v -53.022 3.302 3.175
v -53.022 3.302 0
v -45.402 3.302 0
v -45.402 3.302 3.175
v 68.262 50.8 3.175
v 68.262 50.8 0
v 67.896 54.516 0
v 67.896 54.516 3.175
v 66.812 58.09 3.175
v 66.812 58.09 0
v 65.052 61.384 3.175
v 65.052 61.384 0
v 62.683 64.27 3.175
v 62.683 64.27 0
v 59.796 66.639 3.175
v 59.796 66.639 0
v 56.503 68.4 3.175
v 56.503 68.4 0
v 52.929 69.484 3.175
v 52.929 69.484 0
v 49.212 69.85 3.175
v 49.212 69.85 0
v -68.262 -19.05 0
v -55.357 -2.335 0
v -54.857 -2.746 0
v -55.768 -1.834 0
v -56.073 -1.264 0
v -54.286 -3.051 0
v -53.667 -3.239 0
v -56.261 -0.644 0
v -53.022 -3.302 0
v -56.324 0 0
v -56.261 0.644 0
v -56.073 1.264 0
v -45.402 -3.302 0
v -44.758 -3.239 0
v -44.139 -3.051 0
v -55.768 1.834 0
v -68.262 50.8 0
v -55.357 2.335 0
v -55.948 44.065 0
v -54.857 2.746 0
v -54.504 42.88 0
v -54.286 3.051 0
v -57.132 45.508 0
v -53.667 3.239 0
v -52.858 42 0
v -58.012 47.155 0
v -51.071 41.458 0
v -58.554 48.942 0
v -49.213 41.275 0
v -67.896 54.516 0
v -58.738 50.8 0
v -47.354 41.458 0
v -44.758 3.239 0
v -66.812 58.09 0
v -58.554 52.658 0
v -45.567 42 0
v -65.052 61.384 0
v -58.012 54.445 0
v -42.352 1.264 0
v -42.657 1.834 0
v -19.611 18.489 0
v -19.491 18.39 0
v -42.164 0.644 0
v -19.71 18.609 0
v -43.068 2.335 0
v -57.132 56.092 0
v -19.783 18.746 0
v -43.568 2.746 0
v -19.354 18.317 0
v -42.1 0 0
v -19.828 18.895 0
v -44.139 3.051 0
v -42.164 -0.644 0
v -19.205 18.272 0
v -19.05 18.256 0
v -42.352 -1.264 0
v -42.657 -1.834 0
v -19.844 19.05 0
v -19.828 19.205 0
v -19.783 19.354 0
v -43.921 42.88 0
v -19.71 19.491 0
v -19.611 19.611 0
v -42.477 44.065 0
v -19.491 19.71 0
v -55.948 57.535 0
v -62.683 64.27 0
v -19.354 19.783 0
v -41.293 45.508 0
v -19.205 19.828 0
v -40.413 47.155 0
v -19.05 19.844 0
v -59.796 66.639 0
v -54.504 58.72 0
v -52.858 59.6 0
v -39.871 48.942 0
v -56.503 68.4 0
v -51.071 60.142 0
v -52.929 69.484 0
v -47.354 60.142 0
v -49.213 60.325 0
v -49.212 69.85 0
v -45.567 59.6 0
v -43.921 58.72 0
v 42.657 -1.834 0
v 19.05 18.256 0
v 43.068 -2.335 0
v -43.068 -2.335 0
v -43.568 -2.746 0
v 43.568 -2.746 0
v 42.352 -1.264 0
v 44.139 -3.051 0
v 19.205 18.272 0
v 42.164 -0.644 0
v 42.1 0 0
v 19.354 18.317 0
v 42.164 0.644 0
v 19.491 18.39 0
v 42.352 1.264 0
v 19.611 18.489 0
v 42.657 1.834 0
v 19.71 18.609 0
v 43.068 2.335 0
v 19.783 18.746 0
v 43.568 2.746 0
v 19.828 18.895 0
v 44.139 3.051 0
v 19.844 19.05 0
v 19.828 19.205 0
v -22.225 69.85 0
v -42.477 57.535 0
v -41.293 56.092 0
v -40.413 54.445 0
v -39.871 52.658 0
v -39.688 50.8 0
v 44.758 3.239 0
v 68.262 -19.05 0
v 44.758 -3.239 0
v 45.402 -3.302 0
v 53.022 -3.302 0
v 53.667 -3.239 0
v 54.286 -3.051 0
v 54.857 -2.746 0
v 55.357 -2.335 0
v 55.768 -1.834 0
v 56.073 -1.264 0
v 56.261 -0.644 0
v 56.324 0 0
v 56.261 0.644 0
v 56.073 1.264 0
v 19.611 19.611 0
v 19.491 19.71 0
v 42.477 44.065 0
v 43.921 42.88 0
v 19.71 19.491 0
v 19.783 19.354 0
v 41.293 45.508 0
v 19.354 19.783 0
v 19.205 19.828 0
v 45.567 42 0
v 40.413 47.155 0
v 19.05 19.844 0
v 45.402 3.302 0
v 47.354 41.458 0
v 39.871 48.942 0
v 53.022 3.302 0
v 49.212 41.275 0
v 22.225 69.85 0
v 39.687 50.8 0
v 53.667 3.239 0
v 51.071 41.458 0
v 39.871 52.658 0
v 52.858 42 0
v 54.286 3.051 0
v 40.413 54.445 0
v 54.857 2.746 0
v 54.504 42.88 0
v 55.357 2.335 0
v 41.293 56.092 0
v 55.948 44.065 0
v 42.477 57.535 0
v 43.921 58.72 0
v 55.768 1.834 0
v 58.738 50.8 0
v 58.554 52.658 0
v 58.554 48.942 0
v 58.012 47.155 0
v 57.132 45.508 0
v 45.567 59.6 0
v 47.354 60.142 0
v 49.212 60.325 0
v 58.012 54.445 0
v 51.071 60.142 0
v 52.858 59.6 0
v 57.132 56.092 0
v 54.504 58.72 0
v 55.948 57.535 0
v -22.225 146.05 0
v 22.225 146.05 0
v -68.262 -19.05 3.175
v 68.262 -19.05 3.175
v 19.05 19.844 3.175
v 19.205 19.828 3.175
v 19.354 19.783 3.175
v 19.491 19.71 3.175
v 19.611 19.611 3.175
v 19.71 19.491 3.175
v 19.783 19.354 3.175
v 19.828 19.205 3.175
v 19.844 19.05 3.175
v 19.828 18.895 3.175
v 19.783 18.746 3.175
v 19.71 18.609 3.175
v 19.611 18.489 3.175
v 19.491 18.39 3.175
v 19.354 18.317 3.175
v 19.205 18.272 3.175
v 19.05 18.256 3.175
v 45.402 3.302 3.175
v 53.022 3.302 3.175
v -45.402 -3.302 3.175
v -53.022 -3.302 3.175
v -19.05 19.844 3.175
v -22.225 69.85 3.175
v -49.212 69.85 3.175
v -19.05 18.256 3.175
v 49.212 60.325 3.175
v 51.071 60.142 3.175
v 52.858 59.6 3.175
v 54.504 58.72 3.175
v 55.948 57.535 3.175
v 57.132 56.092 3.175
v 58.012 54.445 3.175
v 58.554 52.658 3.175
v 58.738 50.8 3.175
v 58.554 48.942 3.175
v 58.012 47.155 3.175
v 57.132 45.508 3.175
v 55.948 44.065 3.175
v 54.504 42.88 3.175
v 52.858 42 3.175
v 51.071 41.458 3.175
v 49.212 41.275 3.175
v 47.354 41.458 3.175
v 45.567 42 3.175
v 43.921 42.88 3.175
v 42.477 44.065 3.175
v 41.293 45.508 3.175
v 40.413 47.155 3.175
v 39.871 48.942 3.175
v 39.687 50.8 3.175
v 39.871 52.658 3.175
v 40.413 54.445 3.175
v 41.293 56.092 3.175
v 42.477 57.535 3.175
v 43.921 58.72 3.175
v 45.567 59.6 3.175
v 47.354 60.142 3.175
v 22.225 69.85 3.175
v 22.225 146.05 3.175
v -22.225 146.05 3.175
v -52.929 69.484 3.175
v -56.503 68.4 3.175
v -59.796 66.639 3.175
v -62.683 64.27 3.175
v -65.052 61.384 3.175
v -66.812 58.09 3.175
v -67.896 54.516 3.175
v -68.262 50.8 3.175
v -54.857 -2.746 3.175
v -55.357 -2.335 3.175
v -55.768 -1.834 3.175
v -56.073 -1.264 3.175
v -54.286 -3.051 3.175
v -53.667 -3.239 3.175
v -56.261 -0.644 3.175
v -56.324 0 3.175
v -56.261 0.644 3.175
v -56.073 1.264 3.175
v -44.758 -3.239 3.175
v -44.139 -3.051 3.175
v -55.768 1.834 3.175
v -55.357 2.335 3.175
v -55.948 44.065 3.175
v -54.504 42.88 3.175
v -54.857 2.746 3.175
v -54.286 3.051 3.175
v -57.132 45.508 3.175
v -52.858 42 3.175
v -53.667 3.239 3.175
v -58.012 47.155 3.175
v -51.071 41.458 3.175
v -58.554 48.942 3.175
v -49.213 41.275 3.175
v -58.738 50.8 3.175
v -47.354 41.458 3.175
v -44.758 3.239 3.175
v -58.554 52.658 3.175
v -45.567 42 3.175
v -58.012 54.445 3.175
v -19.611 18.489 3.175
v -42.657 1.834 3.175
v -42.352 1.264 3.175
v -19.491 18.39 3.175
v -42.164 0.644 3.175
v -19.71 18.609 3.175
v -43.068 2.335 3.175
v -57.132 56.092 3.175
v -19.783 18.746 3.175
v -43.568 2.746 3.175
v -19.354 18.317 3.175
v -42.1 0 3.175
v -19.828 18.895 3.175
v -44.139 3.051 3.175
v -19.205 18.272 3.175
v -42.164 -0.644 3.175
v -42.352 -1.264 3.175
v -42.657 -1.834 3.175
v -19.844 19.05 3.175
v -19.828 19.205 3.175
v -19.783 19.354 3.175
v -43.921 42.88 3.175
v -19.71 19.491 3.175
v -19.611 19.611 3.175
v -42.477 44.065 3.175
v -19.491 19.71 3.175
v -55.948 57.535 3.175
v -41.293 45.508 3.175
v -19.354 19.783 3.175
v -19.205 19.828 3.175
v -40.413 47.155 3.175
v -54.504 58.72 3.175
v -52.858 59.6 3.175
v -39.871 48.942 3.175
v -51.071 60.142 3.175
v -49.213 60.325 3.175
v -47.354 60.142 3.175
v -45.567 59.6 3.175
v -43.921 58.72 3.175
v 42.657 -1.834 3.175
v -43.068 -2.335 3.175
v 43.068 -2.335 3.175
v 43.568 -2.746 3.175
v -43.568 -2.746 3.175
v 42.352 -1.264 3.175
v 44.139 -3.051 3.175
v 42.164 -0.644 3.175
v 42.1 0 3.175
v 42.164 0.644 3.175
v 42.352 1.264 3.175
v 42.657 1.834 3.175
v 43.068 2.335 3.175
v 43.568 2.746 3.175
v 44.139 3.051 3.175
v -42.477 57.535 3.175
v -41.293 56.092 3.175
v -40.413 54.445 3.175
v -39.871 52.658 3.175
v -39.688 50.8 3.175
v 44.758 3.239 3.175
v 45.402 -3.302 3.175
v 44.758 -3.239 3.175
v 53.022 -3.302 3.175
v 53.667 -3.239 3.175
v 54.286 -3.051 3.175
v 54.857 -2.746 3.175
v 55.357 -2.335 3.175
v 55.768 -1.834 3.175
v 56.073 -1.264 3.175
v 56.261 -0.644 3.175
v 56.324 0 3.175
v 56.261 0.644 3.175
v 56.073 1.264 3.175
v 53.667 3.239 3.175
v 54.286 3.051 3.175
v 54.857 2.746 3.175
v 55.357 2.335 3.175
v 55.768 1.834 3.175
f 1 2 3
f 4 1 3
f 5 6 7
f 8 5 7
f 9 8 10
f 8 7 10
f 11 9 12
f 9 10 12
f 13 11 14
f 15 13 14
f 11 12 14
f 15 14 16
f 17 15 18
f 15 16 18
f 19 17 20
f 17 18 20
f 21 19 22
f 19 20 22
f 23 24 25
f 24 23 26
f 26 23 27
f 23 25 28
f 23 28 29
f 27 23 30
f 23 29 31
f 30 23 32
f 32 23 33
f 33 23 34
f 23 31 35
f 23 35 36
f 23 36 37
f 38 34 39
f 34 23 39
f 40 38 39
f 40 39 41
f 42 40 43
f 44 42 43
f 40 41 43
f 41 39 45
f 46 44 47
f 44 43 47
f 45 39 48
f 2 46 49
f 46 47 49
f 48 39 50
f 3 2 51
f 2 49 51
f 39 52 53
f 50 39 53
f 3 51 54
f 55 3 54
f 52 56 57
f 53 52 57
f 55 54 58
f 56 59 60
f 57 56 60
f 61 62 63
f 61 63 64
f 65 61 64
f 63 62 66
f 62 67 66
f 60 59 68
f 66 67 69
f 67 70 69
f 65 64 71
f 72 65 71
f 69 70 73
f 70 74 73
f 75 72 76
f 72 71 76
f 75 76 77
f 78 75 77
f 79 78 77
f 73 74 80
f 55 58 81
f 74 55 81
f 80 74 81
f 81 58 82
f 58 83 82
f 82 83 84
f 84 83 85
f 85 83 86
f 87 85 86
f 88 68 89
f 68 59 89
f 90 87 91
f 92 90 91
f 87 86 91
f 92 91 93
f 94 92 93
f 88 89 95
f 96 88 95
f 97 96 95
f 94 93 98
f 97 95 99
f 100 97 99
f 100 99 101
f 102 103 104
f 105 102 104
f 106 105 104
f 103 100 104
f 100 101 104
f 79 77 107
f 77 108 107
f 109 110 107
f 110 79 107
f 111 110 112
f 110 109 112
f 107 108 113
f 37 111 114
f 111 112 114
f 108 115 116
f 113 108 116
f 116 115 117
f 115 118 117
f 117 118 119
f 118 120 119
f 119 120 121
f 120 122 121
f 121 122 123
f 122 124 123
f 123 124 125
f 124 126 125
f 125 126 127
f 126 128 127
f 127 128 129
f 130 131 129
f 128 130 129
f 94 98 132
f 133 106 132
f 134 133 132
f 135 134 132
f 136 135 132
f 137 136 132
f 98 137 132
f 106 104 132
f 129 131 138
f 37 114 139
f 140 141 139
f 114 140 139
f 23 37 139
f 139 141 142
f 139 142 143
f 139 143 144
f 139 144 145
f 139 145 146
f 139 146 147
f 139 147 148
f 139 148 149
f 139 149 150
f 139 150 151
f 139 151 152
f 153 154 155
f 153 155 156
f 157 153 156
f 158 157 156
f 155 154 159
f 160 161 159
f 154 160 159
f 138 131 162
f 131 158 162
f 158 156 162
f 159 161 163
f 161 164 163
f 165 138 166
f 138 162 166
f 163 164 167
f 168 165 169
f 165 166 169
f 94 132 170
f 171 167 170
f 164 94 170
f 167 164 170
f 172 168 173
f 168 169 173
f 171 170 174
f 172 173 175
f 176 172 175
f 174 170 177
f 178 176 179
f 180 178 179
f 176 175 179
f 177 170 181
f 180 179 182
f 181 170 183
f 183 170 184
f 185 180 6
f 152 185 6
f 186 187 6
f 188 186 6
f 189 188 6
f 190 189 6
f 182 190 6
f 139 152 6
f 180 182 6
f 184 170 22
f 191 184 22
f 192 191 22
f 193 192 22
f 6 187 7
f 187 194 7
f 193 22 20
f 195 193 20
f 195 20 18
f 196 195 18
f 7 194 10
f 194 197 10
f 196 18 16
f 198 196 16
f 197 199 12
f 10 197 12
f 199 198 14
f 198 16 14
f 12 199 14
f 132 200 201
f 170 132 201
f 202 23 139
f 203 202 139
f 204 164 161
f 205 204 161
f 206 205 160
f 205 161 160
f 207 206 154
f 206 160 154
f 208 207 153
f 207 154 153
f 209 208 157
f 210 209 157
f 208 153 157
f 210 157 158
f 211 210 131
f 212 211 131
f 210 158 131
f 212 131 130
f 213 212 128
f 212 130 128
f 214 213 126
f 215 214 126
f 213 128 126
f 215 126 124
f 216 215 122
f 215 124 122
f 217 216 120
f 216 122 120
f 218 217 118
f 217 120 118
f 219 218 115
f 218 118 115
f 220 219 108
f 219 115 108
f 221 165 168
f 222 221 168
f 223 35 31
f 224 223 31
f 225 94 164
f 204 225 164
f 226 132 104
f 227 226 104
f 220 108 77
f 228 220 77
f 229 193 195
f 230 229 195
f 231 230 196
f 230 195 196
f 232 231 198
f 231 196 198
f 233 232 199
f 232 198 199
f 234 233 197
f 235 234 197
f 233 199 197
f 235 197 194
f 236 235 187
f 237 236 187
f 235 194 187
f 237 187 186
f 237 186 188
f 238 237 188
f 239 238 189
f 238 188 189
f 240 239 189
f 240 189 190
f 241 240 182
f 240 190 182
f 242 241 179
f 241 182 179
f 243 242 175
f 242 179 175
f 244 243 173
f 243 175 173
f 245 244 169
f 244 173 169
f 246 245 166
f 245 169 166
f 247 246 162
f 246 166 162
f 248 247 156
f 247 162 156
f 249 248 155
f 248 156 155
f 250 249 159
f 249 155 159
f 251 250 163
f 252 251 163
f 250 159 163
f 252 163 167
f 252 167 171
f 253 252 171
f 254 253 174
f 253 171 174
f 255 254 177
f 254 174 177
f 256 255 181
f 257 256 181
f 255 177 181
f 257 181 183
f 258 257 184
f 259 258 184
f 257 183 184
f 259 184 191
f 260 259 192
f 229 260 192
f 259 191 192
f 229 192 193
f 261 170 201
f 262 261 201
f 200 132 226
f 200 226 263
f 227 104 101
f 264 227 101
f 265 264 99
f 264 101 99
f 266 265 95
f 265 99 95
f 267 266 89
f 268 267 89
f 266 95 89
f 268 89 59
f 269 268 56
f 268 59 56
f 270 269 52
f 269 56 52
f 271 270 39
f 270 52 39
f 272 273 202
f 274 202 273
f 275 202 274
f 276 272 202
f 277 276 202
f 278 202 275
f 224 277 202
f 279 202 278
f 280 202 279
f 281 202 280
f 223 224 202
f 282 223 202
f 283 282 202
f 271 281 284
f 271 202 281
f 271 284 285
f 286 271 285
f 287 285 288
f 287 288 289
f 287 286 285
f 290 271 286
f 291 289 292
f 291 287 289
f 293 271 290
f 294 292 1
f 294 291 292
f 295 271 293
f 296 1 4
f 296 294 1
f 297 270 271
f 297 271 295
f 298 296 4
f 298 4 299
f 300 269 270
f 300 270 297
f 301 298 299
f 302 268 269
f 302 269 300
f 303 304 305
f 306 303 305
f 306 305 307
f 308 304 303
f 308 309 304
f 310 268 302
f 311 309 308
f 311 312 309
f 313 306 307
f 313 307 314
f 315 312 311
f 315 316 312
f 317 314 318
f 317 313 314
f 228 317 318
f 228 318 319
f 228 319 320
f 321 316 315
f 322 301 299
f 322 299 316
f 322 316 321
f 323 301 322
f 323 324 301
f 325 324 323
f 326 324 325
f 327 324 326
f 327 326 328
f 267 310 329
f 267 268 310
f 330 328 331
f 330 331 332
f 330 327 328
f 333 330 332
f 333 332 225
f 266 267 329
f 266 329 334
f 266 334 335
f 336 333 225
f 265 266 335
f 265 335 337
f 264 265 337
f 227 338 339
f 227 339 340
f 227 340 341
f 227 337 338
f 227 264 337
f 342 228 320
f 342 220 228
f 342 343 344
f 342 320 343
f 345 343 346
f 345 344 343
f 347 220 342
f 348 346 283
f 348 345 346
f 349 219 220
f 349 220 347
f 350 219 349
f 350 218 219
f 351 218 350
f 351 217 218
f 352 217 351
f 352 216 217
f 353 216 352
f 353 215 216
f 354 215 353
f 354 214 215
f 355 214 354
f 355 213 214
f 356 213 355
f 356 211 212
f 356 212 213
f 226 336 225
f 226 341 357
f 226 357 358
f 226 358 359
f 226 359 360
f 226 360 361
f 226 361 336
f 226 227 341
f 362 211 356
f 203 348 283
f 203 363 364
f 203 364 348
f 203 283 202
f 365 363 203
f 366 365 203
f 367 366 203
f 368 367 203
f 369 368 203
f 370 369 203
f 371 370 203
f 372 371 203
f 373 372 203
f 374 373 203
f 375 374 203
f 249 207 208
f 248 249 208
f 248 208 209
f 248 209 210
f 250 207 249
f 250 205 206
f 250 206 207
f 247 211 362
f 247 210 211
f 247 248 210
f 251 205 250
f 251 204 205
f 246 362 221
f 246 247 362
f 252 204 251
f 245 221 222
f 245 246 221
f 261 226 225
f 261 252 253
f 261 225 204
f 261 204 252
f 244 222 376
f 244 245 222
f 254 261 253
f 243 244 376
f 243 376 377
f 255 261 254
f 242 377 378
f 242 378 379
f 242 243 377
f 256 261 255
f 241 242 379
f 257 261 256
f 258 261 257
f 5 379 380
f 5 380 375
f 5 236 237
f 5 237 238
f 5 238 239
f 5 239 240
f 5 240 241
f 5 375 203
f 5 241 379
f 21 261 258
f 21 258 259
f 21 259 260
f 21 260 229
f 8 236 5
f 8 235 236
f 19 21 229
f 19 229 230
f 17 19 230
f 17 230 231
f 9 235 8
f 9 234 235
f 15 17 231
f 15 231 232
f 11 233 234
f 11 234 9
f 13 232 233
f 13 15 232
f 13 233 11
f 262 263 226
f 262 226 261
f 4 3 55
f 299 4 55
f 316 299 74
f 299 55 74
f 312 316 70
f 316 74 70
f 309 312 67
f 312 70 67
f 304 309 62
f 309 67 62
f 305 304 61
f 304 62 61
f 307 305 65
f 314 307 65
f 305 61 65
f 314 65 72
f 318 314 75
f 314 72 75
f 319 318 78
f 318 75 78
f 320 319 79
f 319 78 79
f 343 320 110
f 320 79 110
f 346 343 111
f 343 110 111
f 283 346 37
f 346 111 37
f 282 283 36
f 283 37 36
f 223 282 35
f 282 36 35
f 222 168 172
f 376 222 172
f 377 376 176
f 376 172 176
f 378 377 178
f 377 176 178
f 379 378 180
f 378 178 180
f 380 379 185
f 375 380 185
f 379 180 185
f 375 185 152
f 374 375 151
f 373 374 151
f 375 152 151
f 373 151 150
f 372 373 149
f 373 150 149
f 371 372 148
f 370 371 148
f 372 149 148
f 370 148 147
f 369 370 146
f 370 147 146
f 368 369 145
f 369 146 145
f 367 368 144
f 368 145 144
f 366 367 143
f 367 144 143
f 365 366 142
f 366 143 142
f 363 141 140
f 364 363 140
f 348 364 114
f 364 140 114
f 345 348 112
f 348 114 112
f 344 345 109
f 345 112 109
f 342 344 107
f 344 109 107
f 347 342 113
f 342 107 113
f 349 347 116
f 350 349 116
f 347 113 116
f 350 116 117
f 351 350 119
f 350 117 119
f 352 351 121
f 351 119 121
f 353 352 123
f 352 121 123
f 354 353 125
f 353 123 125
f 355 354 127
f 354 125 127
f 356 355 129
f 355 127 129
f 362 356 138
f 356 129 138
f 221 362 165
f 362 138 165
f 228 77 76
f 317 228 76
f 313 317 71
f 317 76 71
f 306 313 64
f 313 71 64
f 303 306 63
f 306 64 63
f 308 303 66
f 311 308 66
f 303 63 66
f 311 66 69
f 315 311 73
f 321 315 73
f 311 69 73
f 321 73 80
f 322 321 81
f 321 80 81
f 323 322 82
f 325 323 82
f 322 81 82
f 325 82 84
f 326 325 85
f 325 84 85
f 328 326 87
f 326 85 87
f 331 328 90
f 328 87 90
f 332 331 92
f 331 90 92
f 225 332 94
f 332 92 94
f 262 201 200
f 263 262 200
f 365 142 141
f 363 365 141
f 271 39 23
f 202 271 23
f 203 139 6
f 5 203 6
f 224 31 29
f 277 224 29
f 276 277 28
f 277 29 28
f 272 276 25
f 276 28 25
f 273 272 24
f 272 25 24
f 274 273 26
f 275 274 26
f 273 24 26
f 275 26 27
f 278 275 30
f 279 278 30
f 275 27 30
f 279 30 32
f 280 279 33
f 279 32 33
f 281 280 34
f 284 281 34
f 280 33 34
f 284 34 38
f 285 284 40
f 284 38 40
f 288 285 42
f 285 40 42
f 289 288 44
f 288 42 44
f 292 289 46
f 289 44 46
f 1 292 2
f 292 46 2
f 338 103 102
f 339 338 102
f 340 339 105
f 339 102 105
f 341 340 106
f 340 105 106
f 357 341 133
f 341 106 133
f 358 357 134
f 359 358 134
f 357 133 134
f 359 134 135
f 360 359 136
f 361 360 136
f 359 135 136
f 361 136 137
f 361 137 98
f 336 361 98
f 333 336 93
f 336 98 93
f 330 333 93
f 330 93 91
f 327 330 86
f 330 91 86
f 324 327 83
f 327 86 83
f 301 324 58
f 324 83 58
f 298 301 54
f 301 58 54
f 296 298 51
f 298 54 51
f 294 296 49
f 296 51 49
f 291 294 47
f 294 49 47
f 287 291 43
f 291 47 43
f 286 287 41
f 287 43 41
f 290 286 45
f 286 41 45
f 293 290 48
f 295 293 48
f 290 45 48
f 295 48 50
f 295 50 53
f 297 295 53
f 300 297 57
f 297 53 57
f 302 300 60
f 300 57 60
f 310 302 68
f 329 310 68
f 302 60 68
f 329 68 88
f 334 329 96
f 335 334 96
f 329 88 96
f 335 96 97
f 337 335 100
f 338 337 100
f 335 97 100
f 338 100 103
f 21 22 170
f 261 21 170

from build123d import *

# Parameters (mm, degrees)
F0_W     = 22.225
F0_H     = 76.2
F1_DEPTH = 3.175


with BuildPart() as f1:
    # F0 (on Top) → F1 (new body)
    with BuildSketch(Plane.XY):
        with BuildLine():
            Line((-68.2625, -19.05), (68.2625, -19.05))
            Line((68.2625, -19.05), (68.2625, 19.05))
            Line((68.2625, 19.05), (68.2625, 50.8))
            ThreePointArc((68.2625, 50.8), (62.6828841816, 64.2703841816), (49.2125, 69.85))
            Line((49.2125, 69.85), (49.2125, 60.325))
            ThreePointArc((49.2125, 60.325), (55.9476920908, 57.5351920908), (58.7375, 50.8))
            ThreePointArc((58.7375, 50.8), (49.2125, 41.275), (39.6875, 50.8))
            Line((39.6875, 50.8), (-39.6875, 50.8))
            ThreePointArc((-39.6875, 50.8), (-55.9476920908, 44.0648079092), (-49.2125, 60.325))
            Line((-49.2125, 60.325), (-49.2125, 69.85))
            ThreePointArc((-49.2125, 69.85), (-62.6828841816, 64.2703841816), (-68.2625, 50.8))
            Line((-68.2625, 50.8), (-68.2625, 19.05))
            Line((-68.2625, 19.05), (-68.2625, -19.05))
        make_face()
        with BuildLine():
            Line((-45.4025, -3.302), (-53.0225, -3.302))
            ThreePointArc((-53.0225, -3.302), (-56.3245, 0), (-53.0225, 3.302))
            Line((-53.0225, 3.302), (-45.4025, 3.302))
            ThreePointArc((-45.4025, 3.302), (-42.1005, 0), (-45.4025, -3.302))
        make_face(mode=Mode.SUBTRACT)
        with BuildLine():
            Line((19.05, 18.25625), (-19.05, 18.25625))
            ThreePointArc((-19.05, 18.25625), (-19.84375, 19.05), (-19.05, 19.84375))
            Line((-19.05, 19.84375), (19.05, 19.84375))
            ThreePointArc((19.05, 19.84375), (19.84375, 19.05), (19.05, 18.25625))
        make_face(mode=Mode.SUBTRACT)
        with BuildLine():
            Line((45.4025, 3.302), (53.0225, 3.302))
            ThreePointArc((53.0225, 3.302), (56.3245, 0), (53.0225, -3.302))
            Line((53.0225, -3.302), (45.4025, -3.302))
            ThreePointArc((45.4025, -3.302), (42.1005, 0), (45.4025, 3.302))
        make_face(mode=Mode.SUBTRACT)
        with BuildLine():
            Line((49.2125, 60.325), (49.2125, 69.85))
            Line((49.2125, 69.85), (22.225, 69.85))
            Line((22.225, 69.85), (0, 69.85))
            Line((0, 69.85), (-22.225, 69.85))
            Line((-22.225, 69.85), (-49.2125, 69.85))
            Line((-49.2125, 69.85), (-49.2125, 60.325))
            ThreePointArc((-49.2125, 60.325), (-42.4773079092, 57.5351920908), (-39.6875, 50.8))
            Line((-39.6875, 50.8), (39.6875, 50.8))
            ThreePointArc((39.6875, 50.8), (42.4773079092, 57.5351920908), (49.2125, 60.325))
        make_face()
        with Locations((11.1125, 107.95)):
            Rectangle(F0_W, F0_H)
        with Locations((-11.1125, 107.95)):
            Rectangle(F0_W, F0_H)
    extrude(amount=F1_DEPTH)


solid = f1.part
